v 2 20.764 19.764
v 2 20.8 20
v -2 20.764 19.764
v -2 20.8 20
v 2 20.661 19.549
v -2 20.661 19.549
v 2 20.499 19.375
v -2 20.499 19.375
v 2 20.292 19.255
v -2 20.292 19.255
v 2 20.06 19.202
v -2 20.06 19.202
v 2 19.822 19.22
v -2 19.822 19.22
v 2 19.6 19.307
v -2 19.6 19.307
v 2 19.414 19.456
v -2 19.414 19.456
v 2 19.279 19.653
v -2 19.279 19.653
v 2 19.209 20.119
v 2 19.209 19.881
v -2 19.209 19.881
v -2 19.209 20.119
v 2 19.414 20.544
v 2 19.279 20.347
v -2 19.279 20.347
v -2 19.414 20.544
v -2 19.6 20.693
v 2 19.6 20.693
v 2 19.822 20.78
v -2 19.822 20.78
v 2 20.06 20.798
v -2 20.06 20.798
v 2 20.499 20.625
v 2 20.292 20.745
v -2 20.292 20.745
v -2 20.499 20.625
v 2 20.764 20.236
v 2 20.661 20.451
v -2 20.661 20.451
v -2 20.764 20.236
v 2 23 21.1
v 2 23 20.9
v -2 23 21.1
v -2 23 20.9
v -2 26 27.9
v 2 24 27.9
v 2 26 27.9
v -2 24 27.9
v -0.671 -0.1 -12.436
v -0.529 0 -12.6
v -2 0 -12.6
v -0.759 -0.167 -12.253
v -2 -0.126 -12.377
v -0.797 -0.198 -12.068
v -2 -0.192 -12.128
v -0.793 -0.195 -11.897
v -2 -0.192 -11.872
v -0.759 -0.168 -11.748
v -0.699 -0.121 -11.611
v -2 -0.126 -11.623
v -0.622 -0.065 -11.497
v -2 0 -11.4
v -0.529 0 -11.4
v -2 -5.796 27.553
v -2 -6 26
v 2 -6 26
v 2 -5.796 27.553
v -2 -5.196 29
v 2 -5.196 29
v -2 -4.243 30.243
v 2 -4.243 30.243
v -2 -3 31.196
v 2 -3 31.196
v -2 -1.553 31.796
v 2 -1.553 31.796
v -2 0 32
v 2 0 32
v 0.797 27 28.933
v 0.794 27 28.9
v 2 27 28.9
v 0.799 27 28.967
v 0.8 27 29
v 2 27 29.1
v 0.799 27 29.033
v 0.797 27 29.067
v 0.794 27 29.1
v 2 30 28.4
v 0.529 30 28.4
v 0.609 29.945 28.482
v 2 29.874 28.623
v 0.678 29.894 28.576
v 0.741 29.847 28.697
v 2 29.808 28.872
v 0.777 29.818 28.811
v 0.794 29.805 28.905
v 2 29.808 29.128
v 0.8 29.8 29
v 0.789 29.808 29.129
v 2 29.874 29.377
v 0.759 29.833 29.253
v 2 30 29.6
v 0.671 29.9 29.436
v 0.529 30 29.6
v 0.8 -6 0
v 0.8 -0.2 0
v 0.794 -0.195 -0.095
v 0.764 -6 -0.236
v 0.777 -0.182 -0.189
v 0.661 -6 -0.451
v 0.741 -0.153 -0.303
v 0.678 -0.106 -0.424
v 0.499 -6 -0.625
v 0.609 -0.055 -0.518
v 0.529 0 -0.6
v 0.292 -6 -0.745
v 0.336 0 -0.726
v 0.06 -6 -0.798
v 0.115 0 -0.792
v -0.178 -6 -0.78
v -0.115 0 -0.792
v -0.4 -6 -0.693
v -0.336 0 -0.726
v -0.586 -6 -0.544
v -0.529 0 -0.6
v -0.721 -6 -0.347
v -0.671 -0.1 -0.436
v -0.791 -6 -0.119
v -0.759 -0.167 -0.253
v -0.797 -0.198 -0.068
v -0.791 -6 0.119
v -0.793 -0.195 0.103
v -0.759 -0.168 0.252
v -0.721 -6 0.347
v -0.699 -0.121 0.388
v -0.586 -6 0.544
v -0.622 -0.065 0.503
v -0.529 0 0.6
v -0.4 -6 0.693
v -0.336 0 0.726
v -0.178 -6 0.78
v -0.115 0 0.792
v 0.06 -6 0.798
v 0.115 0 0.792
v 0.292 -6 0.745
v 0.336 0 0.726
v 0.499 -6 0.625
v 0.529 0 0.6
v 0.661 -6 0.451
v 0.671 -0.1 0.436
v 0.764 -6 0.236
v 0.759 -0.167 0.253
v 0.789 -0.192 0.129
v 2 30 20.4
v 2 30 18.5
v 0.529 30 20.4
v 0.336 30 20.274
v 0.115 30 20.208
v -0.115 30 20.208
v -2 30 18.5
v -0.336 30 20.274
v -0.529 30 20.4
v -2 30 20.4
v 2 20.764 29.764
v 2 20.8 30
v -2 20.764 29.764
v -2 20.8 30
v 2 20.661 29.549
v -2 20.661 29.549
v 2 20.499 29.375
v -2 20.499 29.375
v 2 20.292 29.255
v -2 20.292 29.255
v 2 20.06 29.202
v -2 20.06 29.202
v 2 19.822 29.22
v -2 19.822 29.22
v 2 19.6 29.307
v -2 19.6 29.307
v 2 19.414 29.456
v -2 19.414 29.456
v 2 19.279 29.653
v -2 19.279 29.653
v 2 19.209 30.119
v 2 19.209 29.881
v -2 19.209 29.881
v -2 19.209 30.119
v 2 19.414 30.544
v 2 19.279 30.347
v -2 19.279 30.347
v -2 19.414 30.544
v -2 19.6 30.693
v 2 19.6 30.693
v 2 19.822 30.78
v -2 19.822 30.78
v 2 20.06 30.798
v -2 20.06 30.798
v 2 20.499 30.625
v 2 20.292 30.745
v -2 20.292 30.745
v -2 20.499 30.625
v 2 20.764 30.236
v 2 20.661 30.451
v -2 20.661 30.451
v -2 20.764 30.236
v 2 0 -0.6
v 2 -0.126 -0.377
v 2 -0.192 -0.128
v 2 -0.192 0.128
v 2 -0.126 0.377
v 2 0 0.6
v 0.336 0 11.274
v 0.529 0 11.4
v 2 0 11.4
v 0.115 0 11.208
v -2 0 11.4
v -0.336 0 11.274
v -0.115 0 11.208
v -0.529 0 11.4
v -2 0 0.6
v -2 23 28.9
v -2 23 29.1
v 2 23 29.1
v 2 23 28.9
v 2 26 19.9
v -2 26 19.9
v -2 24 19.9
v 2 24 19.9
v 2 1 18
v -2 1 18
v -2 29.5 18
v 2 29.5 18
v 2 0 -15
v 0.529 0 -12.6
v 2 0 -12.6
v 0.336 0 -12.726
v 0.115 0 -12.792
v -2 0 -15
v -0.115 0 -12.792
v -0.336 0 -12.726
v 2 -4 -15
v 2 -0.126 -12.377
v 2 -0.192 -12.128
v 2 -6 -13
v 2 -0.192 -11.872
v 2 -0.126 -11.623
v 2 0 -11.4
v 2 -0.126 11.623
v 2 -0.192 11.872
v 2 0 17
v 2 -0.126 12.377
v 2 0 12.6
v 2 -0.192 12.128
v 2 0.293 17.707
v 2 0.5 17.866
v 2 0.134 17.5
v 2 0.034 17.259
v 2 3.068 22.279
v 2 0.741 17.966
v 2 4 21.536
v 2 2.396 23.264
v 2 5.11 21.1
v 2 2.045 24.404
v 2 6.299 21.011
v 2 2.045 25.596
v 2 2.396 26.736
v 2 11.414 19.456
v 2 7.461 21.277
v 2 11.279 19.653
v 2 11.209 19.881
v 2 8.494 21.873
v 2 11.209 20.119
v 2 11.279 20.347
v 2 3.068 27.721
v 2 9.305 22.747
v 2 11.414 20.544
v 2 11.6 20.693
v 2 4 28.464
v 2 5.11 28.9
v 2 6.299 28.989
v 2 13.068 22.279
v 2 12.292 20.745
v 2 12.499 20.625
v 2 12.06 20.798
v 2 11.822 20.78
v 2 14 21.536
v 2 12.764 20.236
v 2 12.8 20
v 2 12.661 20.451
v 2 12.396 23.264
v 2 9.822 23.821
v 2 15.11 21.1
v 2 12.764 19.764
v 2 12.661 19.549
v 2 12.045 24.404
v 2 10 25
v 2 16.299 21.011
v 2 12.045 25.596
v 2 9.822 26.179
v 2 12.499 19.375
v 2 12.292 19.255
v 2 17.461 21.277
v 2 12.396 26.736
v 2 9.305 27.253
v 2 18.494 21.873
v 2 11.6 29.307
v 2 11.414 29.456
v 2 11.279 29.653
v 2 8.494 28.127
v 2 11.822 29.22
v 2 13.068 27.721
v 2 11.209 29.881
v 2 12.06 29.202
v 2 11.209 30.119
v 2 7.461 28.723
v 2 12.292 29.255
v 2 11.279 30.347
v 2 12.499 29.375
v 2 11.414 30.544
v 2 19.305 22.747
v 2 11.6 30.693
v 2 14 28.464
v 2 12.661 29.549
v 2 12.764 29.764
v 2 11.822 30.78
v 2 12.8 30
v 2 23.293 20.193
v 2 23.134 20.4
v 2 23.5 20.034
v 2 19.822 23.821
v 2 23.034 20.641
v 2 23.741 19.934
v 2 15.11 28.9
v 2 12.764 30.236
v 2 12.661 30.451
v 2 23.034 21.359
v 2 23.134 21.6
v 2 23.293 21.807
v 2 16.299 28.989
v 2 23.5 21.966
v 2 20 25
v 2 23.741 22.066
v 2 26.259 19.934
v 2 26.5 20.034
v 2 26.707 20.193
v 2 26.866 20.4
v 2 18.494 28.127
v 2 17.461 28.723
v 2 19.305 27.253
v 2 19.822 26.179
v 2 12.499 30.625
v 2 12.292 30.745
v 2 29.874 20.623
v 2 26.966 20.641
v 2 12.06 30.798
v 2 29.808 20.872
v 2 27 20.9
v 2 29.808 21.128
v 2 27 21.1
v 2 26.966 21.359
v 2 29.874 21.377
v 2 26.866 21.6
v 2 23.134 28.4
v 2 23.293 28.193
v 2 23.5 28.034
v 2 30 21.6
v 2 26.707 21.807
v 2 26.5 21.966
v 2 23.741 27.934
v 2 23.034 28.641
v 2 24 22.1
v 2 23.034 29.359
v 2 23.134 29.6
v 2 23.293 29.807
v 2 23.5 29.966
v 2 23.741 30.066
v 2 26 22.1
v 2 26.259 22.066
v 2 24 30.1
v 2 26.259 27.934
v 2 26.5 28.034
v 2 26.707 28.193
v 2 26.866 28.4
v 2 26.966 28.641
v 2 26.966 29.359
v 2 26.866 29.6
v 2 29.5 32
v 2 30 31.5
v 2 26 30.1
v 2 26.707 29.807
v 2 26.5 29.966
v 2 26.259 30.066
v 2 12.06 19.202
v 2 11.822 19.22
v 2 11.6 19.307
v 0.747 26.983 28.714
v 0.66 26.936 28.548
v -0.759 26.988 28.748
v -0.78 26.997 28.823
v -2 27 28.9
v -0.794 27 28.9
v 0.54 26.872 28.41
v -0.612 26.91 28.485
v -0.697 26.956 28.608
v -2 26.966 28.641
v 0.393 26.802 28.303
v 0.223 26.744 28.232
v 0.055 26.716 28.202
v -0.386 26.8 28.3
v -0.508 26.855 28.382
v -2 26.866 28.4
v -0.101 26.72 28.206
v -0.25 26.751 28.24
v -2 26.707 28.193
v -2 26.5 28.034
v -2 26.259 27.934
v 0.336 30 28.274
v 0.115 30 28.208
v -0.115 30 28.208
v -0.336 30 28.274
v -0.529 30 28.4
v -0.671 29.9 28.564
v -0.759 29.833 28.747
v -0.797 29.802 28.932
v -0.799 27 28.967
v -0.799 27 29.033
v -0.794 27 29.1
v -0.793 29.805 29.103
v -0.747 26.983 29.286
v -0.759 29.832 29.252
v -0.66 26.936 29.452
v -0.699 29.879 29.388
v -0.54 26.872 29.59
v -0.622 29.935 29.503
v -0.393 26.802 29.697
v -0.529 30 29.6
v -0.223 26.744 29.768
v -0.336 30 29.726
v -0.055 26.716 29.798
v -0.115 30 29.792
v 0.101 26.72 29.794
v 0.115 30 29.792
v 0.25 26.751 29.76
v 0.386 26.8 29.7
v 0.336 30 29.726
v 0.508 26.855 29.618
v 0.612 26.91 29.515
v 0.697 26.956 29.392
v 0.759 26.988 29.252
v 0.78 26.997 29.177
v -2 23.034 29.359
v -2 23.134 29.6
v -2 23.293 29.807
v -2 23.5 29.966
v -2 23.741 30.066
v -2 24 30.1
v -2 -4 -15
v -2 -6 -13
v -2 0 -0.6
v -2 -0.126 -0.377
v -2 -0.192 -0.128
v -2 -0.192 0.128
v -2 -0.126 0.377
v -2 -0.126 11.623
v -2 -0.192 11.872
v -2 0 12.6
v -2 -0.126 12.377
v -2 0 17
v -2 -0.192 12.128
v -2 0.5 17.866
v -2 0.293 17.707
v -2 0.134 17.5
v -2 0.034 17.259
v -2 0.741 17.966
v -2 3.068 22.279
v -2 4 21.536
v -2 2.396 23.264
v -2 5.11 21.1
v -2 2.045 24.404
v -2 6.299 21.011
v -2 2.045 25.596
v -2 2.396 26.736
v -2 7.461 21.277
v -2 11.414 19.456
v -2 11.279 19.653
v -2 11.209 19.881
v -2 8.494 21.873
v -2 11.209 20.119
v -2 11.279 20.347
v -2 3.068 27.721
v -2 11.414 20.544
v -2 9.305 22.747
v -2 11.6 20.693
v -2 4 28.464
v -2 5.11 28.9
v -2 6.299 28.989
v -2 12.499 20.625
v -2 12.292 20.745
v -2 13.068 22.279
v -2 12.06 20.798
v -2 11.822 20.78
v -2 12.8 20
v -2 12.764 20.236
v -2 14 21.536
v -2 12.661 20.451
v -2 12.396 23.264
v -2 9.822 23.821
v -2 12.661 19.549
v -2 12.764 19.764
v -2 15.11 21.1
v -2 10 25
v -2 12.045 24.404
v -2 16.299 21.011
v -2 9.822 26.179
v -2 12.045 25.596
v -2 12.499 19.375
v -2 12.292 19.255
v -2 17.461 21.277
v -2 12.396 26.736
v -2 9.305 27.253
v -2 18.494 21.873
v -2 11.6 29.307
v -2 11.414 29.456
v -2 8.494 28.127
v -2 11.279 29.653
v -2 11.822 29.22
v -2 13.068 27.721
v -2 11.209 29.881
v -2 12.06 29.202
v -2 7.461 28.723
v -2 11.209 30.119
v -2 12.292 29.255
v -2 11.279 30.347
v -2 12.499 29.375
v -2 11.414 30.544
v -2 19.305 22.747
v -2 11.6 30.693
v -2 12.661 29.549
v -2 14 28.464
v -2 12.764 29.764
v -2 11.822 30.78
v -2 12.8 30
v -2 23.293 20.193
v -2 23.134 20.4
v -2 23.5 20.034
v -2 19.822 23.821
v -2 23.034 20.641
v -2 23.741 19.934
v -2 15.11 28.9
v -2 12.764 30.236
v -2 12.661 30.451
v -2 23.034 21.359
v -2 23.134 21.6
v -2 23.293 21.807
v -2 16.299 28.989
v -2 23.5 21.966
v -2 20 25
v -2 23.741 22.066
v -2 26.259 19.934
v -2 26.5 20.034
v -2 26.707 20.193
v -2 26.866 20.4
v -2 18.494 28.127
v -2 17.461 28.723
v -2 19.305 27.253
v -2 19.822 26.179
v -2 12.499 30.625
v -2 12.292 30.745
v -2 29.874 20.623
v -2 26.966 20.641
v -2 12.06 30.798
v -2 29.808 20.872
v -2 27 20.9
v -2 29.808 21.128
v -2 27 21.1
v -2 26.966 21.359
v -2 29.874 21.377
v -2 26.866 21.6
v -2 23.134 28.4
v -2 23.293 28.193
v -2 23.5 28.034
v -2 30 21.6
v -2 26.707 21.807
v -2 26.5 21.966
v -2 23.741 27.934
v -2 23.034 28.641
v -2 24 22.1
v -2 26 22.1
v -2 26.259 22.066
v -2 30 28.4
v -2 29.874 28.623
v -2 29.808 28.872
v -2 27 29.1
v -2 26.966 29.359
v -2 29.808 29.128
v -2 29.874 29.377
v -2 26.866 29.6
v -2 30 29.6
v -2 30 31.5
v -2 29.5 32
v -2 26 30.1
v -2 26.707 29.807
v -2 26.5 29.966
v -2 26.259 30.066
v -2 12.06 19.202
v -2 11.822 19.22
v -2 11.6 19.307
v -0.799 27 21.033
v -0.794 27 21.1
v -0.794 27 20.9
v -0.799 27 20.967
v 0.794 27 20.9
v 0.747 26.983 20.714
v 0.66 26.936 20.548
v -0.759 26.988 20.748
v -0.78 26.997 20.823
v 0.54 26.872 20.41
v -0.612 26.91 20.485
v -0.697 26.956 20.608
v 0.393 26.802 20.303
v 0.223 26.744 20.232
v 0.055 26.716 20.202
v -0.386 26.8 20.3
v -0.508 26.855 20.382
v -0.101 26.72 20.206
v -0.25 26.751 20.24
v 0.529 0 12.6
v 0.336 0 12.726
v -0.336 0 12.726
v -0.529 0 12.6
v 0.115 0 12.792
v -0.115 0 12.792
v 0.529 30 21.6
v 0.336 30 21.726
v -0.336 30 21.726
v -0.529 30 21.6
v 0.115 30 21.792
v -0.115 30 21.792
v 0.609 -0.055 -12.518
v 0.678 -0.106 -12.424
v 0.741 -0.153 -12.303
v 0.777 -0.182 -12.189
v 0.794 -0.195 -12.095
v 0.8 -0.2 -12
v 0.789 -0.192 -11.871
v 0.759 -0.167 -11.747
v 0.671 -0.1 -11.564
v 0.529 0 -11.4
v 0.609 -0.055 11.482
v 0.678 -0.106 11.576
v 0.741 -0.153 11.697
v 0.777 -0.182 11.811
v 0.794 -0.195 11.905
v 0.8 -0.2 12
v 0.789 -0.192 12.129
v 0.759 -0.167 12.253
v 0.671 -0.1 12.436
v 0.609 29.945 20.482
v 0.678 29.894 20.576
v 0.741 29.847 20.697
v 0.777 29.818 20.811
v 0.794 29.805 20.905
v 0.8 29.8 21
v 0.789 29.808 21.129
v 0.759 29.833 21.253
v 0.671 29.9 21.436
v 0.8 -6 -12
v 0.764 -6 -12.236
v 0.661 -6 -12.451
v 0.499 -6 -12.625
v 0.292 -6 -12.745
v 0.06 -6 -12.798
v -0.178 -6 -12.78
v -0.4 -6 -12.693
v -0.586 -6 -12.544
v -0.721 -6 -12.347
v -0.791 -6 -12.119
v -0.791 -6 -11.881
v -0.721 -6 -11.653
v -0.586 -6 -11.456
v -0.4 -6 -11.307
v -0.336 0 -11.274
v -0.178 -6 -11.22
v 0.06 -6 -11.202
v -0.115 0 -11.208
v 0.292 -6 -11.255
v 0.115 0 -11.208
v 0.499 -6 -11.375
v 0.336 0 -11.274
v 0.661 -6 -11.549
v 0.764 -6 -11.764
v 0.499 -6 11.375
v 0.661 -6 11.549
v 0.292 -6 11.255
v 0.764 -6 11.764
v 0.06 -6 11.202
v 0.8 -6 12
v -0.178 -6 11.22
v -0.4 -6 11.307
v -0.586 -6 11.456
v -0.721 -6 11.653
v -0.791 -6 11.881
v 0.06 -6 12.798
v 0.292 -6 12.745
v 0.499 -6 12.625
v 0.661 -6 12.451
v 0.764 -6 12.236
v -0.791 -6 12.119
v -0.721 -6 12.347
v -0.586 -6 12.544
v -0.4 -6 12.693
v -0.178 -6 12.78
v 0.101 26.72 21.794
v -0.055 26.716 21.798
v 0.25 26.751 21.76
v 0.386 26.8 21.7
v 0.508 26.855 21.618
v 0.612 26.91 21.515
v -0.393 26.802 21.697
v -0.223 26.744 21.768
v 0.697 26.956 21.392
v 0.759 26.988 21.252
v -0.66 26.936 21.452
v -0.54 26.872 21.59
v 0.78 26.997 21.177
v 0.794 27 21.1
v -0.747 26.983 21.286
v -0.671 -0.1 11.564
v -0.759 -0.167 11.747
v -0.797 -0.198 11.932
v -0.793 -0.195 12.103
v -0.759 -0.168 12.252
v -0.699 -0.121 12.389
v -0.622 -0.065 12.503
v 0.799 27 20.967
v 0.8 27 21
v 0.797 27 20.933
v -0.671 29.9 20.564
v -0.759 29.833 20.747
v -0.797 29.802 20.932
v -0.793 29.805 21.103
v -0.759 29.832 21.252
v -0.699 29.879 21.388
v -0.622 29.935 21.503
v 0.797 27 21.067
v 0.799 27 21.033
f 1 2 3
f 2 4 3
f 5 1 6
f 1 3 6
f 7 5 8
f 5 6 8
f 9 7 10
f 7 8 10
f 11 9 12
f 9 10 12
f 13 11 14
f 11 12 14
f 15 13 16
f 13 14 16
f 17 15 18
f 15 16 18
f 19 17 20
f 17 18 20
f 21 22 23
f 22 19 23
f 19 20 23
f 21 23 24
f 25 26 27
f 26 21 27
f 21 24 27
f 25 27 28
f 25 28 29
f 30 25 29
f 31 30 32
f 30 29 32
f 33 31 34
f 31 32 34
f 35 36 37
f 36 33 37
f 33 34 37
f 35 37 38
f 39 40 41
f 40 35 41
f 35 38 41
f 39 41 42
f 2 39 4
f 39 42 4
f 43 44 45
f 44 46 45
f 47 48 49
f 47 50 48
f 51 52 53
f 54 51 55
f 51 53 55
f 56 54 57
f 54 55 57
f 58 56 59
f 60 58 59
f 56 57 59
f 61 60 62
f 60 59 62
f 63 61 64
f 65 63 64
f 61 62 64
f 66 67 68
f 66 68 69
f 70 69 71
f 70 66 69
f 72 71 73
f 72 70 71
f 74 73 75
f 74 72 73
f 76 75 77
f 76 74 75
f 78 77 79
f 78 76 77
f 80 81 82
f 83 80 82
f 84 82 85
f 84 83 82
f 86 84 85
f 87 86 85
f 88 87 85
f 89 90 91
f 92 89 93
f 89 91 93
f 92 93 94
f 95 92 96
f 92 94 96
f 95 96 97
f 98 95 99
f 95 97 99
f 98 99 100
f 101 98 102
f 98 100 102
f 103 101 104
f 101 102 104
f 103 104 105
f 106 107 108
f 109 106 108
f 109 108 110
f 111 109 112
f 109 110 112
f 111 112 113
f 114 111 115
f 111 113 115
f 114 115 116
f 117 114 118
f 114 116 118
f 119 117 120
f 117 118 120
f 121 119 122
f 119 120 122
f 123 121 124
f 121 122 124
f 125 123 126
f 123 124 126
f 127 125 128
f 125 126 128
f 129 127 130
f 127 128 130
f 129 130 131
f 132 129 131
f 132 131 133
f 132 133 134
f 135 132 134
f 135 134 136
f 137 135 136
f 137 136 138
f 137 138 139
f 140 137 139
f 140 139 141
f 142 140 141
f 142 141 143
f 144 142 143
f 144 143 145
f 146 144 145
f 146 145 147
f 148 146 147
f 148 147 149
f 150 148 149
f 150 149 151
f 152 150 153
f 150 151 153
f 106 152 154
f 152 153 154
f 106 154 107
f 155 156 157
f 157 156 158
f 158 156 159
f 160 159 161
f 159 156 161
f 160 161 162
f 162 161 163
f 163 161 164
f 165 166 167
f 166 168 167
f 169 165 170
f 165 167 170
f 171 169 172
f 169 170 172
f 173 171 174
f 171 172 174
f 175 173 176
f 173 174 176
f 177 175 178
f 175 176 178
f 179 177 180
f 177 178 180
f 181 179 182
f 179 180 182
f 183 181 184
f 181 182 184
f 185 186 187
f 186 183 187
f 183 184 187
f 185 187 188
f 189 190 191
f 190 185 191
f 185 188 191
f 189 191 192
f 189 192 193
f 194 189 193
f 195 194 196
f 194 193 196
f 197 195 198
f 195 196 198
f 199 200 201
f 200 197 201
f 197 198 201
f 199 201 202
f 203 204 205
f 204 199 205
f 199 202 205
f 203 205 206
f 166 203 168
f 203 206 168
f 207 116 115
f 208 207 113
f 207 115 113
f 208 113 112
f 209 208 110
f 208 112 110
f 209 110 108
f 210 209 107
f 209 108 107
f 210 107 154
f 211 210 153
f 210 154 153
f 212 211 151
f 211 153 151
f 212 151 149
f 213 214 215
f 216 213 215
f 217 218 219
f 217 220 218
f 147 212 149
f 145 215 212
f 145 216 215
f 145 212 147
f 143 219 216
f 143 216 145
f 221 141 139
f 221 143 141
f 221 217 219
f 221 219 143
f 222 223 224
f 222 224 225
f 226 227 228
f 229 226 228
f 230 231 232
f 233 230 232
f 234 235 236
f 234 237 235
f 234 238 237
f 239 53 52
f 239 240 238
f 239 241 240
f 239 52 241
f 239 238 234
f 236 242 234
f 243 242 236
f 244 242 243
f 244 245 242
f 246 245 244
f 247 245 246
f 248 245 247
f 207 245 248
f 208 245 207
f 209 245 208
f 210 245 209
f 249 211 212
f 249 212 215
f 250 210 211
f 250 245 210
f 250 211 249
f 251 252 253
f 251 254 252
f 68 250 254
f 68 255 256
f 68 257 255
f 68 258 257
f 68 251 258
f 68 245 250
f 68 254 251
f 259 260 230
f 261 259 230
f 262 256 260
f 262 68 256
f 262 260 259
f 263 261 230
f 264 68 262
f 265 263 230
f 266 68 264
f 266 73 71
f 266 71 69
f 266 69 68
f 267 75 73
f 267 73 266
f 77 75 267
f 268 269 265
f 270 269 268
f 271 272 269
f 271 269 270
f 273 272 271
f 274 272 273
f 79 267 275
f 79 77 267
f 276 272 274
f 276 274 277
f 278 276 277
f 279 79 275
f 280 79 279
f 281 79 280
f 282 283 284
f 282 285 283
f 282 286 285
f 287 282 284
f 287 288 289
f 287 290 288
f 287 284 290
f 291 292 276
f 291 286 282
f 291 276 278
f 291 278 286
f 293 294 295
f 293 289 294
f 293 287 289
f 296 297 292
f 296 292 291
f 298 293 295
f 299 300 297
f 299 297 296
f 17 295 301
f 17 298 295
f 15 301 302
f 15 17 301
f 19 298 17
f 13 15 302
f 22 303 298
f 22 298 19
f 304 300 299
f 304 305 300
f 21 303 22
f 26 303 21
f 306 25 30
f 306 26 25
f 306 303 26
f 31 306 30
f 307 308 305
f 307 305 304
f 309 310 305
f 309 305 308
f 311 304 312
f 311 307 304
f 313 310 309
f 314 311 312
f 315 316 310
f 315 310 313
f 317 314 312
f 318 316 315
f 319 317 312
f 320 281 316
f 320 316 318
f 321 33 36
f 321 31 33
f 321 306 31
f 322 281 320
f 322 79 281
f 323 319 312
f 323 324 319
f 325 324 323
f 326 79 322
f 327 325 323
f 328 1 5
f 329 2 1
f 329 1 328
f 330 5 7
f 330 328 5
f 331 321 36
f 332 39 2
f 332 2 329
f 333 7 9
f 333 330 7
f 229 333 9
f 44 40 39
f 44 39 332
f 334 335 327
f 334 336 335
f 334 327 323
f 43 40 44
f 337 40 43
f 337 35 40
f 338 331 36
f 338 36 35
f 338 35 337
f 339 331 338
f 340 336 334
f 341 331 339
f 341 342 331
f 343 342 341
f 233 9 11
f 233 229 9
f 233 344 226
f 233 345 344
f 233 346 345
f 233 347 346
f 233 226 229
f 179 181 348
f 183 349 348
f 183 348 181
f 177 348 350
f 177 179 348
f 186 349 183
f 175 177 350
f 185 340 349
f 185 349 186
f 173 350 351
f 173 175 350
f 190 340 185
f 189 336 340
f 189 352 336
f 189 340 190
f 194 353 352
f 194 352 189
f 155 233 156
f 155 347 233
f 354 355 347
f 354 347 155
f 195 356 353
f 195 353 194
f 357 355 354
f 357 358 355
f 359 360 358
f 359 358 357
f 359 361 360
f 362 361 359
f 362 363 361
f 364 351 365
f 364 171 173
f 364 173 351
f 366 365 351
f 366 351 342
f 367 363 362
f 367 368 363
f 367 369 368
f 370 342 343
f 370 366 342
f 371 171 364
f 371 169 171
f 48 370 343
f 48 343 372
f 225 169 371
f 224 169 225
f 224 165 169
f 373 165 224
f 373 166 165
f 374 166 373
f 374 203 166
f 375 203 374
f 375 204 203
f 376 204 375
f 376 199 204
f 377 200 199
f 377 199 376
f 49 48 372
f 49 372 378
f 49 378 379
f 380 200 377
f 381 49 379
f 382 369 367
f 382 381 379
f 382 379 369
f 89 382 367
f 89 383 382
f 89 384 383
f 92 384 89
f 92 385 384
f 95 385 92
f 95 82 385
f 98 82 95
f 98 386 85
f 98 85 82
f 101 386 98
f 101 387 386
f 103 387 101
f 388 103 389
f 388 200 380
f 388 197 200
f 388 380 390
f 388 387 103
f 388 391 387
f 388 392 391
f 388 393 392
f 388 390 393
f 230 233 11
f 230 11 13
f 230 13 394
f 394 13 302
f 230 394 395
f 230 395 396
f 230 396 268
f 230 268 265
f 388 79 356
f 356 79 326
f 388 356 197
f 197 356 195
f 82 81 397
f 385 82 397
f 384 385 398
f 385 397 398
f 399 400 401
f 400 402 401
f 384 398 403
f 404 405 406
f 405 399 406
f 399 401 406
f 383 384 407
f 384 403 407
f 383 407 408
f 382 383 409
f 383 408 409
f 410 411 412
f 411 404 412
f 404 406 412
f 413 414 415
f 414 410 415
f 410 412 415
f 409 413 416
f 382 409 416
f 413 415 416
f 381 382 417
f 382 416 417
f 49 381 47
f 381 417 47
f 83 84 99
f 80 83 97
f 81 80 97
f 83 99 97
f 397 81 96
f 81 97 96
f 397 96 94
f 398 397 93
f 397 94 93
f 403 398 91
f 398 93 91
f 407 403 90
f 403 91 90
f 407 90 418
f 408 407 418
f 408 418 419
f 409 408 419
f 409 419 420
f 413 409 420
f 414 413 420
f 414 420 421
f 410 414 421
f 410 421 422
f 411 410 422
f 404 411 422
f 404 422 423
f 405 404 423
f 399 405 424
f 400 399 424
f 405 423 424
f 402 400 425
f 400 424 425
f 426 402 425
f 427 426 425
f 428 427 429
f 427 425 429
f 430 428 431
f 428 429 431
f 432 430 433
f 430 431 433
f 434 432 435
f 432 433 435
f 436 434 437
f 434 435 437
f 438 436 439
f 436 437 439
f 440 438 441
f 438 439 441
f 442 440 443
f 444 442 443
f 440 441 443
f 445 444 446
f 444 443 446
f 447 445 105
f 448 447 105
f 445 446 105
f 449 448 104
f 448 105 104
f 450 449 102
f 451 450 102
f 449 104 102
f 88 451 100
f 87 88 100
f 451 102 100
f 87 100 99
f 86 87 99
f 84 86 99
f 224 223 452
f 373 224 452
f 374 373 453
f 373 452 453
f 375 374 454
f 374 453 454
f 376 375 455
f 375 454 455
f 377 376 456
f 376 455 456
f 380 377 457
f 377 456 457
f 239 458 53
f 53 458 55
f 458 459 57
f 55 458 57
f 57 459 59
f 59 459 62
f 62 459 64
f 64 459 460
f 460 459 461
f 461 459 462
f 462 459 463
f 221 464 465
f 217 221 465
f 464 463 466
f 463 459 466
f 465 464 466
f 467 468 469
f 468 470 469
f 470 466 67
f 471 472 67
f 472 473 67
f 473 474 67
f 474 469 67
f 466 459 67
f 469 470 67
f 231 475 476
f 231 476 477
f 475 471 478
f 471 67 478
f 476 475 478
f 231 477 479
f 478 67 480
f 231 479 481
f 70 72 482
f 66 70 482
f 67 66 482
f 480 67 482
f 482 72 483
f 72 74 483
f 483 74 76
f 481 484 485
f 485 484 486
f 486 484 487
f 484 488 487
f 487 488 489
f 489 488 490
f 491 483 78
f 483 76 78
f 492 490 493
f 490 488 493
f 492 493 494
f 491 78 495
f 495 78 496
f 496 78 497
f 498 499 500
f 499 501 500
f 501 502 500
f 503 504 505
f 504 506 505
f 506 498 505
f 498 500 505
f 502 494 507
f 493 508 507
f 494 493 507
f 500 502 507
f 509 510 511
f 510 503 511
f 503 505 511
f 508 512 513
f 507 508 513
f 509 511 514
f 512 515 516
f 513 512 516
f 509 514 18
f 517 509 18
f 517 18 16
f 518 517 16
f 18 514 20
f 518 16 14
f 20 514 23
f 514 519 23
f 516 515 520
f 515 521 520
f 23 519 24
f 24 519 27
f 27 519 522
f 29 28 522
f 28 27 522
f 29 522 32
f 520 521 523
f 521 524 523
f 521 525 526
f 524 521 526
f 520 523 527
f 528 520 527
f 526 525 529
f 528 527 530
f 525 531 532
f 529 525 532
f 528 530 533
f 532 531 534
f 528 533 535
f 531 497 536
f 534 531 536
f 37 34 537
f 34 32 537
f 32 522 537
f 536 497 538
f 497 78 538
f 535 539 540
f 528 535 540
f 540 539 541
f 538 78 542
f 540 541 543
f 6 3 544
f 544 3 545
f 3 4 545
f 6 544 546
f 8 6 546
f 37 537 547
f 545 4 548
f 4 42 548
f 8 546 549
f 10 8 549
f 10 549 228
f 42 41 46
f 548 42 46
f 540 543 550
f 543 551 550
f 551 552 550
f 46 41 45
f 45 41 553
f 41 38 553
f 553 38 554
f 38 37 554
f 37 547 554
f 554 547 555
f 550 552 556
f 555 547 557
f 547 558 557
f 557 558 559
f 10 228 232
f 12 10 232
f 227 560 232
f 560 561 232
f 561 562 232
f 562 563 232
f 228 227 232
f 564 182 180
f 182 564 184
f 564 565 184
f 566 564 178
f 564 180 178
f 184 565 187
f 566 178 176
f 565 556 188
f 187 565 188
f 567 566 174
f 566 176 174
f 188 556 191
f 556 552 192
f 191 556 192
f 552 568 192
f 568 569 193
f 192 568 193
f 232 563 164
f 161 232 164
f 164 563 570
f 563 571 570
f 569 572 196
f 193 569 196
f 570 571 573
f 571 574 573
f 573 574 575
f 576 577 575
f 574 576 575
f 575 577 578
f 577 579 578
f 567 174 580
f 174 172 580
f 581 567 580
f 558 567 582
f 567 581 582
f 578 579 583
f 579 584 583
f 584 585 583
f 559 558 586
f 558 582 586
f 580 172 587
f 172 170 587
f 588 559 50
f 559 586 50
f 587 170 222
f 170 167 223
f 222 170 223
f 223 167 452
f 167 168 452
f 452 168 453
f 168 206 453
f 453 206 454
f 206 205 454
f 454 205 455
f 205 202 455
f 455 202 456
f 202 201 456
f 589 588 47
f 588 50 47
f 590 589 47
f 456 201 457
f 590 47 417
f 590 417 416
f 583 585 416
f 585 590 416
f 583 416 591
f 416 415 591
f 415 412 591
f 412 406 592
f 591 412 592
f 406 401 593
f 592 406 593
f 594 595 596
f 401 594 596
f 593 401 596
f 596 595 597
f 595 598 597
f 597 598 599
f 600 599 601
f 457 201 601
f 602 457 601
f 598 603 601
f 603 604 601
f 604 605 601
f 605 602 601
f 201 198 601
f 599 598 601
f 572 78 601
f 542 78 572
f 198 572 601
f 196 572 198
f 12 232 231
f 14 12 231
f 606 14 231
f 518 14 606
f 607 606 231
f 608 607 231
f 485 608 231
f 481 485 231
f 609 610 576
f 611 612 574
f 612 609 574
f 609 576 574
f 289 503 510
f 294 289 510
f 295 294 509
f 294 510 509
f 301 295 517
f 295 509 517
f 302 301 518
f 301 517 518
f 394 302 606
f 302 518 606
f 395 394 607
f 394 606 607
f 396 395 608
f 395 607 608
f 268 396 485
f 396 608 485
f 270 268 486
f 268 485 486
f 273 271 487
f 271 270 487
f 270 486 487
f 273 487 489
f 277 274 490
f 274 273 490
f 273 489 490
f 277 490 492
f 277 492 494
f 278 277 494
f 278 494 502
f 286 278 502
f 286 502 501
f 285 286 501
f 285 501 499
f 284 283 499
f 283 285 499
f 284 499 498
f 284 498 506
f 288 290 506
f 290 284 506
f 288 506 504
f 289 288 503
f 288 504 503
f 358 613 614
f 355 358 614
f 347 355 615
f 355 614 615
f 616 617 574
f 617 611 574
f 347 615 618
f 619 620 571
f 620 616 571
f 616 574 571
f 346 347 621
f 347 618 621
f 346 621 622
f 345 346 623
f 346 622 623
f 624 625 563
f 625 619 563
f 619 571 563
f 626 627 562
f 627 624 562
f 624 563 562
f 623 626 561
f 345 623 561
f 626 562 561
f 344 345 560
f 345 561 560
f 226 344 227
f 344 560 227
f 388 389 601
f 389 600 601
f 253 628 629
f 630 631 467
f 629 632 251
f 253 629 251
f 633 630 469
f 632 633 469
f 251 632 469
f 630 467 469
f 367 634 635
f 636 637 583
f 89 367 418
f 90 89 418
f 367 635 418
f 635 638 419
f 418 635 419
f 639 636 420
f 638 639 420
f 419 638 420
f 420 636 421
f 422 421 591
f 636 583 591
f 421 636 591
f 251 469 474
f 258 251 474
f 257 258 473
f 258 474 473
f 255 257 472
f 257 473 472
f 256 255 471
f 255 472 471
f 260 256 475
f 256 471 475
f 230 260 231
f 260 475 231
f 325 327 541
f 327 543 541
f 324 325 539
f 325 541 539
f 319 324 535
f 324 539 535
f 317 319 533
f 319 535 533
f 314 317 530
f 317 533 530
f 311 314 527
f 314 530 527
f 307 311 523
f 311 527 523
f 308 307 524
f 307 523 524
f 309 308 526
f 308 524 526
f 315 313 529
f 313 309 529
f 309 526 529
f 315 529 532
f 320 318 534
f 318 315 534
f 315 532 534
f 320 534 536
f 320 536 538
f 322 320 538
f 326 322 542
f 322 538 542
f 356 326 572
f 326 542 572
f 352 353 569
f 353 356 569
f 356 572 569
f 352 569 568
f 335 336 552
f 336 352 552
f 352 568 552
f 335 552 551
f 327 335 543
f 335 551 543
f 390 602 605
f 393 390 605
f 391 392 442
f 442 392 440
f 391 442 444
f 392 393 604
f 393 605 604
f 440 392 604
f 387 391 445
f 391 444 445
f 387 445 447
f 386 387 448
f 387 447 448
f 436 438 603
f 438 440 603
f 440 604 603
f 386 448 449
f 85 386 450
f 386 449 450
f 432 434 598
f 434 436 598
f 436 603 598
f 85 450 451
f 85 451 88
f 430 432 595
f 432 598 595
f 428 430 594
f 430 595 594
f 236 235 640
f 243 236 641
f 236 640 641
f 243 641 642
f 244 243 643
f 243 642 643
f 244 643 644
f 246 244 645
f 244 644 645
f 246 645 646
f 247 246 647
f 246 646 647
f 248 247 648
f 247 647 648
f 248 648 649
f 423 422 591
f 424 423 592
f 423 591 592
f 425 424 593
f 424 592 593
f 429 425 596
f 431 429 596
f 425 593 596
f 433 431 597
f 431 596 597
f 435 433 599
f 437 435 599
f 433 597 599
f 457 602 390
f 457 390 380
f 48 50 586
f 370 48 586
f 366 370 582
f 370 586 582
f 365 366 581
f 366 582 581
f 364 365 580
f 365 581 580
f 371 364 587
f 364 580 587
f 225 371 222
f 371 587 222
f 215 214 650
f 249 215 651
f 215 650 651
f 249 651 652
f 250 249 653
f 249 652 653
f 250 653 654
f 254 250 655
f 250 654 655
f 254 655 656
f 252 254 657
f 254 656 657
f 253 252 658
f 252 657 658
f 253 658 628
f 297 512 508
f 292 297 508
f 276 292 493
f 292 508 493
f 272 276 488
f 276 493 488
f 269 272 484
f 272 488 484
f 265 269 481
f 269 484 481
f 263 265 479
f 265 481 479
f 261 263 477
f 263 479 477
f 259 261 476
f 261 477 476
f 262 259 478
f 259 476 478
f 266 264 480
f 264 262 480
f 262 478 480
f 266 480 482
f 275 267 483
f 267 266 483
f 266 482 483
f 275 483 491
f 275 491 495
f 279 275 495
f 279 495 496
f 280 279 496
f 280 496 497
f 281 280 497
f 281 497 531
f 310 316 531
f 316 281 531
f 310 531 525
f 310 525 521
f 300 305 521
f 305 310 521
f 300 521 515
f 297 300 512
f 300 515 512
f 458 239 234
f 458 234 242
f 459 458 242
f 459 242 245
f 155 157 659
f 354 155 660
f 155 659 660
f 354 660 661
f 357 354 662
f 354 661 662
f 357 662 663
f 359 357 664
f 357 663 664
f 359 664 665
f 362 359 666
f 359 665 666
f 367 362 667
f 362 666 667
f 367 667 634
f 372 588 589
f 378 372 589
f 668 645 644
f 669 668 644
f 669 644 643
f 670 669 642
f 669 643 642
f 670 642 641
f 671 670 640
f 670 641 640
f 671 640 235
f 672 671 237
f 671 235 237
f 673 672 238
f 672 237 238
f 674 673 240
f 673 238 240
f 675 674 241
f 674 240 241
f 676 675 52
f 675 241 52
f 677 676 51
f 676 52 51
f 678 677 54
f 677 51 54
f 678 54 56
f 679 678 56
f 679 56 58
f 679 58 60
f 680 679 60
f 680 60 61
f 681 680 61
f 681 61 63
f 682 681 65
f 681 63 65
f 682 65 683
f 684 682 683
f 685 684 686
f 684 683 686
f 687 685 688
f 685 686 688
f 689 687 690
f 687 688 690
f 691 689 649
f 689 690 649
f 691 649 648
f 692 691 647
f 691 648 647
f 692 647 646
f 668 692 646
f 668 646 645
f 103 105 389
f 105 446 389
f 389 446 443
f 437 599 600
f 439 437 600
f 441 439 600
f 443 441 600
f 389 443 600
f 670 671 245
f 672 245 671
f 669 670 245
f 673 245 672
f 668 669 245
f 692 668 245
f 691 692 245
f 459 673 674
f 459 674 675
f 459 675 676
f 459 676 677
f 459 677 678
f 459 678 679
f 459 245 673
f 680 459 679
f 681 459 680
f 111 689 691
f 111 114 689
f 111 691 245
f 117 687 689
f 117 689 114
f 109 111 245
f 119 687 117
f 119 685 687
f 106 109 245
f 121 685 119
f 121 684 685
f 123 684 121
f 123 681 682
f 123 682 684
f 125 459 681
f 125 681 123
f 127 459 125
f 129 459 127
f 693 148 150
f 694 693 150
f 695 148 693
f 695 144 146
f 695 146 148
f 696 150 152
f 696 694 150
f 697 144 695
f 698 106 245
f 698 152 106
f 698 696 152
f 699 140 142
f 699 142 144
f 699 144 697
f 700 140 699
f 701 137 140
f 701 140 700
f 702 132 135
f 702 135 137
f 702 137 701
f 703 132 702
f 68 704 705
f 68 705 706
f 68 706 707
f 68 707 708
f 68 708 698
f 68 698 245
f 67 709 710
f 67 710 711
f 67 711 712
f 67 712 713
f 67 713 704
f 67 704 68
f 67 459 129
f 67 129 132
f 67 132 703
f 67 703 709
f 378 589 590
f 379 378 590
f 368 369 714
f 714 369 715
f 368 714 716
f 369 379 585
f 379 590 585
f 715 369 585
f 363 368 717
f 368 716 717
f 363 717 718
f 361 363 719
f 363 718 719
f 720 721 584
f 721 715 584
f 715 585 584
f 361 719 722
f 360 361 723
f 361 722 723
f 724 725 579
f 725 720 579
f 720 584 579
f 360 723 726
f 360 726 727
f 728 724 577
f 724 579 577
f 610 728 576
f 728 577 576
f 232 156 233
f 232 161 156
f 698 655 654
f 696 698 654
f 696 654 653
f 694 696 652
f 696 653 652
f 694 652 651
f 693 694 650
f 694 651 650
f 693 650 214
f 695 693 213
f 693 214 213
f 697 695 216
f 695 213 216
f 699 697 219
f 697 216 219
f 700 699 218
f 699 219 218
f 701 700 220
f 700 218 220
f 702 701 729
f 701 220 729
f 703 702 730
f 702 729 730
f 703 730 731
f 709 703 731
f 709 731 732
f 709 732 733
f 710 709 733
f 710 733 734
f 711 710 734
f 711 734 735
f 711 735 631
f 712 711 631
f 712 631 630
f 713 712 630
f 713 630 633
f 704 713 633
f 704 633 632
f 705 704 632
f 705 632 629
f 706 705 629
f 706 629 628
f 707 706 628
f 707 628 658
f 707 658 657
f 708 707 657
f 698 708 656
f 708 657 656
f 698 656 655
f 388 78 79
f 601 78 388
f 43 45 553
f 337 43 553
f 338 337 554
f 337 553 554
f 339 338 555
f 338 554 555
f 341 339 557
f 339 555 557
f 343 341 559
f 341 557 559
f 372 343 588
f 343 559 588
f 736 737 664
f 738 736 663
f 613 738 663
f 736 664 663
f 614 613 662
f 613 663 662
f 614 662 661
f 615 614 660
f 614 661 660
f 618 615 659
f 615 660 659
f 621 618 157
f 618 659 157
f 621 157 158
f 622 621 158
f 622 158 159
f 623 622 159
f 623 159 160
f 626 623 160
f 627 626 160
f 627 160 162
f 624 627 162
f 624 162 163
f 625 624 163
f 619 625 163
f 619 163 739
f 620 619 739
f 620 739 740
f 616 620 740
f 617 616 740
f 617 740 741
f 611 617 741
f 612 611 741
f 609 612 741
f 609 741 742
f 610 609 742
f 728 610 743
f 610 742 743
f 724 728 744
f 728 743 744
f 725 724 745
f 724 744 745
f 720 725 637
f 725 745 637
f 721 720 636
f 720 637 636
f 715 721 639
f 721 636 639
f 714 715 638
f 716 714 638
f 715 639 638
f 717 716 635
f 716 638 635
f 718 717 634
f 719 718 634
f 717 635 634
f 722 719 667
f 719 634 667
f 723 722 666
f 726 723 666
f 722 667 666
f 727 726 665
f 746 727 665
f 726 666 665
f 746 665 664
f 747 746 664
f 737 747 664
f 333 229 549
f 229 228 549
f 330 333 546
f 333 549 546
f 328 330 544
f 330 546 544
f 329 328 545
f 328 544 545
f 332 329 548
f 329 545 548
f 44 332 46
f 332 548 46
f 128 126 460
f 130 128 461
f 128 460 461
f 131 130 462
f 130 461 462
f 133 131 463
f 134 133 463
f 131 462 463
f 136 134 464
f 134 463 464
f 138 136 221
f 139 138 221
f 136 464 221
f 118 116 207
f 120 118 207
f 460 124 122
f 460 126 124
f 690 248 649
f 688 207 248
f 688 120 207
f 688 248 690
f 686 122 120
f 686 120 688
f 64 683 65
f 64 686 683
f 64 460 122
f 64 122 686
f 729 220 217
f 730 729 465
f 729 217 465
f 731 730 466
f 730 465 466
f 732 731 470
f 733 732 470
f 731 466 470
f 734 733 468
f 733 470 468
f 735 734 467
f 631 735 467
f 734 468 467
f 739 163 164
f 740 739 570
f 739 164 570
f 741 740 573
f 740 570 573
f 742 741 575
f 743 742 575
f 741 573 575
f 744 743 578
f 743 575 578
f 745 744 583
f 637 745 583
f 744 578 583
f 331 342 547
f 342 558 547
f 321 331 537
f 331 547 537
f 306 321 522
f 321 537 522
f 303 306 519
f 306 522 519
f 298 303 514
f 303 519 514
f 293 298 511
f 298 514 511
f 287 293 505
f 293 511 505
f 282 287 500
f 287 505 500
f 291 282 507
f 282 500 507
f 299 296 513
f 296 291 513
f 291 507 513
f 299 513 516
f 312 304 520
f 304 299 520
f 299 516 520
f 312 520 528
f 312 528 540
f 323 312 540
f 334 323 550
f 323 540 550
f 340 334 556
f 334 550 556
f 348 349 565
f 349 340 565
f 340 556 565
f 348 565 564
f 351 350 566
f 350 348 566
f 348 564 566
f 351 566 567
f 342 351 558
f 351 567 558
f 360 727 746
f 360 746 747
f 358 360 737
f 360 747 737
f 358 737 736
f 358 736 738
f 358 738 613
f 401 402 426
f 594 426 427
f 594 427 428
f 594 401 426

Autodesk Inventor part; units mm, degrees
ref_plane "YZ Plane" through (0, 0, 0) normal (1, 0, 0) x (0, 1, 0)
ref_plane "XZ Plane" through (0, 0, 0) normal (0, 1, 0) x (-1, 0, 0)
ref_plane "XY Plane" through (0, 0, 0) normal (0, 0, 1) x (1, 0, 0)
sketch "スケッチ1" plane through (0, 0, 0) normal (1, 0, 0) x (0, 1, 0)
  line L0 (0, 12) -> (0, -12) construction
  arc A0 (0, 0.6) -> (0, -0.6) centre (0.8, 0) ccw
  arc A1 (0, -11.4) -> (0, -12.6) centre (0.8, -12) ccw
  arc A2 (0, 12.6) -> (0, 11.4) centre (0.8, 12) ccw
  line L1 (0, 11.4) -> (0, 0.6)
  line L2 (0, -0.6) -> (0, -11.4)
  line L3 (0, -12.6) -> (0, -15)
  line L4 (0, -15) -> (-4, -15)
  line L5 (-4, -15) -> (-6, -13)
  line L6 (-6, -13) -> (-6, 26)
  line L7 (0, 32) -> (29.5, 32)
  line L8 (0, 12.6) -> (0, 17)
  line L9 (1, 18) -> (29.5, 18)
  arc A3 (1, 18) -> (0, 17) centre (1, 17) ccw
  line L10 (0.8, 12) -> (0.8, -12) construction
  arc A4 (0, 32) -> (-6, 26) centre (0, 26) ccw
  line L11 (30, 18.5) -> (30, 20.4)
  line L12 (30, 31.5) -> (29.5, 32)
  line L13 (30, 18.5) -> (29.5, 18)
  arc A5 (30, 29.6) -> (30, 28.4) centre (30.8, 29) ccw
  arc A6 (30, 21.6) -> (30, 20.4) centre (30.8, 21) ccw
  line L14 (30.8, 29) -> (30.8, 21) construction
  line L15 (30, 29.6) -> (30, 31.5)
  line L16 (30, 28.4) -> (30, 29.6) construction
  line L17 (30, 21.6) -> (30, 28.4)
  line L18 (30, 20.4) -> (30, 21.6) construction
  line L19 (30.8, 25) -> (24.681, 25) construction
  line L20 (26, 30.1) -> (24, 30.1)
  line L21 (23, 29.1) -> (23, 28.9)
  line L22 (24, 27.9) -> (26, 27.9)
  line L23 (27, 28.9) -> (27, 29.1)
  arc A7 (27, 29.1) -> (26, 30.1) centre (26, 29.1) ccw
  arc A8 (26, 27.9) -> (27, 28.9) centre (26, 28.9) ccw
  arc A9 (23, 28.9) -> (24, 27.9) centre (24, 28.9) ccw
  arc A10 (24, 30.1) -> (23, 29.1) centre (24, 29.1) ccw
  line L24 (27, 29) -> (30.8, 29) construction
  line L25 (26, 19.9) -> (24, 19.9)
  line L26 (23, 20.9) -> (23, 21.1)
  line L27 (24, 22.1) -> (26, 22.1)
  line L28 (27, 21.1) -> (27, 20.9)
  arc A11 (26, 19.9) -> (27, 20.9) centre (26, 20.9) ccw
  arc A12 (27, 21.1) -> (26, 22.1) centre (26, 21.1) ccw
  arc A13 (24, 22.1) -> (23, 21.1) centre (24, 21.1) ccw
  arc A14 (23, 20.9) -> (24, 19.9) centre (24, 20.9) ccw
  line L29 (20, 30) -> (12, 30) construction
  line L30 (12, 30) -> (12, 20) construction
  line L31 (12, 20) -> (20, 20) construction
  line L32 (20, 20) -> (20, 30) construction
  circle A15 centre (20, 30) radius 0.8
  circle A16 centre (20, 20) radius 0.8
  circle A17 centre (12, 20) radius 0.8
  circle A18 centre (12, 30) radius 0.8
  line L33 (20, 30) -> (12, 20) construction
  circle A19 centre (16, 25) radius 4
  line L34 (16, 25) -> (6, 25) construction
  circle A20 centre (6, 25) radius 4
  point P0 (0, 0)
  point P1 (0, 0)
  point P2 (30, 32)
  point P3 (30, 18)
  point P4 (27, 21)
  dimension "d0" = 24
  dimension "d1" = 1
  dimension "d2" = 0.8
  dimension "d3" = 1
  dimension "d4" = 6
  dimension "d5" = 2
  dimension "d6" = 3
  dimension "d7" = 2
  dimension "d8" = 6
  dimension "d11" = 6
  dimension "d31" = 0.5
  dimension "d32" = 0.5
  dimension "d33" = 0.5
  dimension "d34" = 0.5
  dimension "d35" = 30
  dimension "d36" = 14
  dimension "d37" = 1
  dimension "d38" = 0.8
  dimension "d39" = 8
  dimension "d40" = 1
  dimension "d41" = 3
  dimension "d42" = 4
  dimension "d43" = 2.2
  dimension "d44" = 1.6
  dimension "d45" = 10
  dimension "d46" = 8
  dimension "d47" = 10
  dimension "d48" = 10
extrude "押し出し1" add sketch "スケッチ1" along normal mid plane 4
sketch "スケッチ2" plane through (-2, 0, 11.4) normal (0, 1, 0) x (1, 0, 0)
  circle A0 centre (2, 11.4) radius 0.8
  line L0 (4, -1.2) -> (0, -1.2) construction
  line L1 (4, 0) -> (0, 0) construction
  line L2 (0, -1.2) -> (4, 0) construction
  circle A1 centre (2, -0.6) radius 0.8
  line L3 (4, 22.8) -> (0, 22.8) construction
  line L4 (4, 24) -> (0, 24) construction
  line L5 (0, 22.8) -> (4, 24) construction
  circle A2 centre (2, 23.4) radius 0.8
  dimension "d14" = 1.6
extrude "押し出し2" cut sketch "スケッチ2" against normal blind 6
sketch "スケッチ4" plane through (-2, 30, 28.4) normal (0, 1, 0) x (1, 0, 0)
  line L0 (4, -1.2) -> (0, -1.2) construction
  line L1 (4, 0) -> (0, 0) construction
  line L2 (0, -1.2) -> (4, 0) construction
  line L3 (4, 6.8) -> (0, 6.8) construction
  line L4 (4, 8) -> (0, 8) construction
  line L5 (0, 6.8) -> (4, 8) construction
  circle A0 centre (2, -0.6) radius 0.8
  circle A1 centre (2, 7.4) radius 0.8
  point P0 (2, 28.4)
  dimension "d49" = 1.6
extrude "押し出し4" cut sketch "スケッチ4" against normal blind 5
equation "\"d32\" = d31"
equation "\"d33\" = d31"
equation "\"d34\" = d33"
properties part number "handle"
